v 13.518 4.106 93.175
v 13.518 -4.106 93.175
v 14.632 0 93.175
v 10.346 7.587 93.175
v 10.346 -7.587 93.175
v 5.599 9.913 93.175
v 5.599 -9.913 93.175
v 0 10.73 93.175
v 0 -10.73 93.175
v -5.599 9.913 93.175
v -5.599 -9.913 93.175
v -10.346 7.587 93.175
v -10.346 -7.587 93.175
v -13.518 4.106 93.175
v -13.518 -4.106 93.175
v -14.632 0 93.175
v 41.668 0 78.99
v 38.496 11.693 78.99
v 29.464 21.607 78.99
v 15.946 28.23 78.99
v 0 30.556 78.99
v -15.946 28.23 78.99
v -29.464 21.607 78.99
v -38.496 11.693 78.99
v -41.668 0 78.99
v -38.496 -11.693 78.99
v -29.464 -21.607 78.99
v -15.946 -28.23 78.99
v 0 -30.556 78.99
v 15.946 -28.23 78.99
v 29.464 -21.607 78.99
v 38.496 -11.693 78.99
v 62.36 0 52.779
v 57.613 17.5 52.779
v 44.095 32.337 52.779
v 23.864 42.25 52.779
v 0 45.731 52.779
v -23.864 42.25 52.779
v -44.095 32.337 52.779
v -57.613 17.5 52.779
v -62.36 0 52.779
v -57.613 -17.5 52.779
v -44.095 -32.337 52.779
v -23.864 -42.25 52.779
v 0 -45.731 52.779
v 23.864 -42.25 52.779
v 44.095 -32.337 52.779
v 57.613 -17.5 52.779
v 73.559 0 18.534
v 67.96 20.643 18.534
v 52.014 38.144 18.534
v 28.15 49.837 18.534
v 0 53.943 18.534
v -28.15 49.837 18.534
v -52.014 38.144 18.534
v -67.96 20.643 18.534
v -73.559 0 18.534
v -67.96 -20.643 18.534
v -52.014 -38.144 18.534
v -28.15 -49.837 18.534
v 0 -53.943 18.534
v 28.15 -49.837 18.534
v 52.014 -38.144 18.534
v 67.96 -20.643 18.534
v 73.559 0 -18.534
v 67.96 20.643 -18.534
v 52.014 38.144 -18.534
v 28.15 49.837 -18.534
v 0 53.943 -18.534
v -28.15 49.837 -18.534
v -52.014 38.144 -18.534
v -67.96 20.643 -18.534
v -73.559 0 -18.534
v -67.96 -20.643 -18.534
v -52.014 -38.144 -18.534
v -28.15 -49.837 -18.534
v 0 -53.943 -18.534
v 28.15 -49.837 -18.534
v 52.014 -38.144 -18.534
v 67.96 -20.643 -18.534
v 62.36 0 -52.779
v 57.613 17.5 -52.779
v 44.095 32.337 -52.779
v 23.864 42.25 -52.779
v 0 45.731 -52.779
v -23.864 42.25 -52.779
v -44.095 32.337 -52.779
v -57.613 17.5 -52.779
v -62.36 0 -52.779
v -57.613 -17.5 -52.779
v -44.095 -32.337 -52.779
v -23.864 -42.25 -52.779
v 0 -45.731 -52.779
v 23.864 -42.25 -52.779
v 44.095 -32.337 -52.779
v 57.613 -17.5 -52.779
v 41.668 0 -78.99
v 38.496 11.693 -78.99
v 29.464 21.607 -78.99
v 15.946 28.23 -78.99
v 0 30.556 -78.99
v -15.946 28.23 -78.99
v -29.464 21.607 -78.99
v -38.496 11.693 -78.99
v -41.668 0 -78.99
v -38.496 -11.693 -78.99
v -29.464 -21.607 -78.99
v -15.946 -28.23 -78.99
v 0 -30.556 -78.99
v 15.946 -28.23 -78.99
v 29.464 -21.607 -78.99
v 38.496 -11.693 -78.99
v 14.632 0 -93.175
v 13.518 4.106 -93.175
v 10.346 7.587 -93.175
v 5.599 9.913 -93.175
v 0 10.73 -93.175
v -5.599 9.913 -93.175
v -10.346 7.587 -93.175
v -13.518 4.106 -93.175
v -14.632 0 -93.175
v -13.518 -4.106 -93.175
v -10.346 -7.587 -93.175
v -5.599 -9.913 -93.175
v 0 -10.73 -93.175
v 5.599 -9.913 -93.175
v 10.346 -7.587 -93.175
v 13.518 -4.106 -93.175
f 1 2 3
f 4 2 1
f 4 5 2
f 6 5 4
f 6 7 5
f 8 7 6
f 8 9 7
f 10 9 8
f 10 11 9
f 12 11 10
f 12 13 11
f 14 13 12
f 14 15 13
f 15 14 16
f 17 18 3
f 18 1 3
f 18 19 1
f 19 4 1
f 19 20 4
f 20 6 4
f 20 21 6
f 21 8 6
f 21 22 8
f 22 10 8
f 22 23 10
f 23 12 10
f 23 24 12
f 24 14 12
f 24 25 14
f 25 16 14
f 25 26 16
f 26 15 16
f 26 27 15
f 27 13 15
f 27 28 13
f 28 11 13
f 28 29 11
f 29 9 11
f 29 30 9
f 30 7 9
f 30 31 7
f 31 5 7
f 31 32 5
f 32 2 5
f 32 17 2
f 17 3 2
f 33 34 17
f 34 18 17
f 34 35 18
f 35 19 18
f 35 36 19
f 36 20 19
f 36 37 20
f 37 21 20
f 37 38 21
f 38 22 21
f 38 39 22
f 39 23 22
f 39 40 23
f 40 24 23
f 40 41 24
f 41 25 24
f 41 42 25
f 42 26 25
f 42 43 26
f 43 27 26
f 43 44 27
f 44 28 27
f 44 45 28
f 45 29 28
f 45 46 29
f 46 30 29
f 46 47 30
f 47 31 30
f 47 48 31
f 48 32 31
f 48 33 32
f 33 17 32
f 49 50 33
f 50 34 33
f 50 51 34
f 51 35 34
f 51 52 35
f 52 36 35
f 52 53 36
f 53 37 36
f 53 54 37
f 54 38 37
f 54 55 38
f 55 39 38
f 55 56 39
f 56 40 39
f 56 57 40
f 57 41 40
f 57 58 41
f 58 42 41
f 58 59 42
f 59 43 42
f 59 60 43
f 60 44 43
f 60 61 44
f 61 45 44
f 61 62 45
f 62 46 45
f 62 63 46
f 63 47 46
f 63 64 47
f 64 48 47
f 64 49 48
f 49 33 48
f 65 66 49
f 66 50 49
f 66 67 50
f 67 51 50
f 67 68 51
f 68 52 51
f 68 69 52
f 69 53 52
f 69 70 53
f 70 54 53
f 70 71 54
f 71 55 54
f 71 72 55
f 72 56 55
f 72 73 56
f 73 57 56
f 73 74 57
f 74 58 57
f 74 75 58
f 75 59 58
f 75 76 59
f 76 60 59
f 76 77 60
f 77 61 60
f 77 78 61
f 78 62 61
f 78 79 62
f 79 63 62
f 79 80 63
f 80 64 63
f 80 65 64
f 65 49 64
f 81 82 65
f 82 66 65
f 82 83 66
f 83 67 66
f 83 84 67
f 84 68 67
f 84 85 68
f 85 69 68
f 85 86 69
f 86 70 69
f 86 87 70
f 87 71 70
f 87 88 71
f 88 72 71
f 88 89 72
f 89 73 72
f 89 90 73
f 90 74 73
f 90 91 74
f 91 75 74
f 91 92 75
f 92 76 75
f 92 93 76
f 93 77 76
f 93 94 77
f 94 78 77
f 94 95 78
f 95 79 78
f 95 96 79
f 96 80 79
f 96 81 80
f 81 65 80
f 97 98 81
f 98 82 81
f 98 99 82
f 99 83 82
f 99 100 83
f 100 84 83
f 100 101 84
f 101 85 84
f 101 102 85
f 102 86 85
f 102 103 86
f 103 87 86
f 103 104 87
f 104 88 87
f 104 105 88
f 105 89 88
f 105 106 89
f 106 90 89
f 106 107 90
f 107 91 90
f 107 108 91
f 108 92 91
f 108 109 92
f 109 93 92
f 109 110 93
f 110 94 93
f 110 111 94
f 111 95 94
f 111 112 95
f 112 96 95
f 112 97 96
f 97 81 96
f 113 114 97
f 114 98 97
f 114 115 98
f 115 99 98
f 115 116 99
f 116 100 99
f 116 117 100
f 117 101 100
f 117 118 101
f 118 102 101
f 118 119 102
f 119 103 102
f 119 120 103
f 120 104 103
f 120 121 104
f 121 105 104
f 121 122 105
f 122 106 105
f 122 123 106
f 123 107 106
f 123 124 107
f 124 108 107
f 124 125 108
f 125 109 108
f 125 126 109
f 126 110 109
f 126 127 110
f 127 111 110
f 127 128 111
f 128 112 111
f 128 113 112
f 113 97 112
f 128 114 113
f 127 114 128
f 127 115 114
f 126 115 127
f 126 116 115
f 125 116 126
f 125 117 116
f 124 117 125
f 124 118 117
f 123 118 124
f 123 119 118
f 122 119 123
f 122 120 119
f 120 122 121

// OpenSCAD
// Generated by SolidPython 1.0.1 on 2020-07-29 00:46:52


scale(v = [15, 11, 19]) {
	sphere(r = 5);
}
/***********************************************
*********      SolidPython code:      **********
************************************************
 
# import packages: SolidPython
from solid import *
from solid.utils import *
from itertools import chain, combinations, permutations


class Resize:

    def __init__(self, scad_file):
        self.scad_file = scad_file
        #self.scad_file = import_scad(scad_file)
        # cone/cylinder param:
        self.r1 = 0
        self.r2 = 0
        self.h = 0
        # rectangular prism param:
        self.w = 0
        self.l = 0
        # ellipse param:
        self.r = 0

    # import OpenScad code (file name corresponds to shape)


    # classify shape + parameters
    def assign(self, param1, param2, param3):
        if self.scad_file == 'cone.scad':
            self.r1 = param1
            self.r2 = param2
            self.h = param3
        elif self.scad_file == 'cylinder.scad':
            self.r1 = param1
            self.r2 = param2
            self.h = param3
        elif self.scad_file == 'rectangularPrism.scad':
            self.h = param1
            self.l = param2
            self.w = param3
        else:
            self.r = param1
            self.h = param2

    # resize parameters
    def iterate(self):
        x = range(3, 20, 2)
        i = 1
        if self.scad_file == 'cone.scad':
            tempList = list(permutations(x, 2))
            for temp in tempList:
                param1 = temp[0]
                param2 = temp[1]
                filepath = 'produced_scad_files/' + 'cone' + str(param1) + '_' + str(param2) + '_' + '.scad'
                scad_render_to_file(cylinder(h=param1, r1=param2, r2=0), filepath)

        elif self.scad_file == 'cylinder.scad':
            tempList = list(permutations(x, 3))
            for temp in tempList:
                param1 = temp[0]
                param2 = temp[1]
                filepath = 'produced_scad_files/' + 'cylinder' + str(param1) + '_' + str(param2) + '_' + '.scad'
                scad_render_to_file(cylinder(h=param1, r1=param2, r2=param2), filepath)

        elif self.scad_file == 'rectangularPrism.scad':
            tempList = list(permutations(x, 3))
            for temp in tempList:
                param1 = temp[0]
                param2 = temp[1]
                param3 = temp[2]
                filepath = 'produced_scad_files/' + 'rectangularPrism' + str(param1) + '_' + str(param2) + '_' + str(
                    param3) + '.scad'
                scad_render_to_file(cube(size=(param1, param2, param3)), filepath)

        elif self.scad_file == 'ellipse.scad':
            tempList = list(permutations(x, 4))
            for temp in tempList:
                param1 = temp[0]
                param2 = temp[1]
                param3 = temp[2]
                param4 = temp[3]
                filepath = 'produced_scad_files/' + 'ellipse' + str(param1) + '_' + str(param2) + '_' + str(param3) + '_' + str(param4) + '.scad'
                scad_render_to_file(scale([param1, param2, param3])(sphere(r=param4)), filepath)

    def render_to_scadfile(self):
        scad_render_to_file(scad, 'example.scad') 
 
************************************************/
